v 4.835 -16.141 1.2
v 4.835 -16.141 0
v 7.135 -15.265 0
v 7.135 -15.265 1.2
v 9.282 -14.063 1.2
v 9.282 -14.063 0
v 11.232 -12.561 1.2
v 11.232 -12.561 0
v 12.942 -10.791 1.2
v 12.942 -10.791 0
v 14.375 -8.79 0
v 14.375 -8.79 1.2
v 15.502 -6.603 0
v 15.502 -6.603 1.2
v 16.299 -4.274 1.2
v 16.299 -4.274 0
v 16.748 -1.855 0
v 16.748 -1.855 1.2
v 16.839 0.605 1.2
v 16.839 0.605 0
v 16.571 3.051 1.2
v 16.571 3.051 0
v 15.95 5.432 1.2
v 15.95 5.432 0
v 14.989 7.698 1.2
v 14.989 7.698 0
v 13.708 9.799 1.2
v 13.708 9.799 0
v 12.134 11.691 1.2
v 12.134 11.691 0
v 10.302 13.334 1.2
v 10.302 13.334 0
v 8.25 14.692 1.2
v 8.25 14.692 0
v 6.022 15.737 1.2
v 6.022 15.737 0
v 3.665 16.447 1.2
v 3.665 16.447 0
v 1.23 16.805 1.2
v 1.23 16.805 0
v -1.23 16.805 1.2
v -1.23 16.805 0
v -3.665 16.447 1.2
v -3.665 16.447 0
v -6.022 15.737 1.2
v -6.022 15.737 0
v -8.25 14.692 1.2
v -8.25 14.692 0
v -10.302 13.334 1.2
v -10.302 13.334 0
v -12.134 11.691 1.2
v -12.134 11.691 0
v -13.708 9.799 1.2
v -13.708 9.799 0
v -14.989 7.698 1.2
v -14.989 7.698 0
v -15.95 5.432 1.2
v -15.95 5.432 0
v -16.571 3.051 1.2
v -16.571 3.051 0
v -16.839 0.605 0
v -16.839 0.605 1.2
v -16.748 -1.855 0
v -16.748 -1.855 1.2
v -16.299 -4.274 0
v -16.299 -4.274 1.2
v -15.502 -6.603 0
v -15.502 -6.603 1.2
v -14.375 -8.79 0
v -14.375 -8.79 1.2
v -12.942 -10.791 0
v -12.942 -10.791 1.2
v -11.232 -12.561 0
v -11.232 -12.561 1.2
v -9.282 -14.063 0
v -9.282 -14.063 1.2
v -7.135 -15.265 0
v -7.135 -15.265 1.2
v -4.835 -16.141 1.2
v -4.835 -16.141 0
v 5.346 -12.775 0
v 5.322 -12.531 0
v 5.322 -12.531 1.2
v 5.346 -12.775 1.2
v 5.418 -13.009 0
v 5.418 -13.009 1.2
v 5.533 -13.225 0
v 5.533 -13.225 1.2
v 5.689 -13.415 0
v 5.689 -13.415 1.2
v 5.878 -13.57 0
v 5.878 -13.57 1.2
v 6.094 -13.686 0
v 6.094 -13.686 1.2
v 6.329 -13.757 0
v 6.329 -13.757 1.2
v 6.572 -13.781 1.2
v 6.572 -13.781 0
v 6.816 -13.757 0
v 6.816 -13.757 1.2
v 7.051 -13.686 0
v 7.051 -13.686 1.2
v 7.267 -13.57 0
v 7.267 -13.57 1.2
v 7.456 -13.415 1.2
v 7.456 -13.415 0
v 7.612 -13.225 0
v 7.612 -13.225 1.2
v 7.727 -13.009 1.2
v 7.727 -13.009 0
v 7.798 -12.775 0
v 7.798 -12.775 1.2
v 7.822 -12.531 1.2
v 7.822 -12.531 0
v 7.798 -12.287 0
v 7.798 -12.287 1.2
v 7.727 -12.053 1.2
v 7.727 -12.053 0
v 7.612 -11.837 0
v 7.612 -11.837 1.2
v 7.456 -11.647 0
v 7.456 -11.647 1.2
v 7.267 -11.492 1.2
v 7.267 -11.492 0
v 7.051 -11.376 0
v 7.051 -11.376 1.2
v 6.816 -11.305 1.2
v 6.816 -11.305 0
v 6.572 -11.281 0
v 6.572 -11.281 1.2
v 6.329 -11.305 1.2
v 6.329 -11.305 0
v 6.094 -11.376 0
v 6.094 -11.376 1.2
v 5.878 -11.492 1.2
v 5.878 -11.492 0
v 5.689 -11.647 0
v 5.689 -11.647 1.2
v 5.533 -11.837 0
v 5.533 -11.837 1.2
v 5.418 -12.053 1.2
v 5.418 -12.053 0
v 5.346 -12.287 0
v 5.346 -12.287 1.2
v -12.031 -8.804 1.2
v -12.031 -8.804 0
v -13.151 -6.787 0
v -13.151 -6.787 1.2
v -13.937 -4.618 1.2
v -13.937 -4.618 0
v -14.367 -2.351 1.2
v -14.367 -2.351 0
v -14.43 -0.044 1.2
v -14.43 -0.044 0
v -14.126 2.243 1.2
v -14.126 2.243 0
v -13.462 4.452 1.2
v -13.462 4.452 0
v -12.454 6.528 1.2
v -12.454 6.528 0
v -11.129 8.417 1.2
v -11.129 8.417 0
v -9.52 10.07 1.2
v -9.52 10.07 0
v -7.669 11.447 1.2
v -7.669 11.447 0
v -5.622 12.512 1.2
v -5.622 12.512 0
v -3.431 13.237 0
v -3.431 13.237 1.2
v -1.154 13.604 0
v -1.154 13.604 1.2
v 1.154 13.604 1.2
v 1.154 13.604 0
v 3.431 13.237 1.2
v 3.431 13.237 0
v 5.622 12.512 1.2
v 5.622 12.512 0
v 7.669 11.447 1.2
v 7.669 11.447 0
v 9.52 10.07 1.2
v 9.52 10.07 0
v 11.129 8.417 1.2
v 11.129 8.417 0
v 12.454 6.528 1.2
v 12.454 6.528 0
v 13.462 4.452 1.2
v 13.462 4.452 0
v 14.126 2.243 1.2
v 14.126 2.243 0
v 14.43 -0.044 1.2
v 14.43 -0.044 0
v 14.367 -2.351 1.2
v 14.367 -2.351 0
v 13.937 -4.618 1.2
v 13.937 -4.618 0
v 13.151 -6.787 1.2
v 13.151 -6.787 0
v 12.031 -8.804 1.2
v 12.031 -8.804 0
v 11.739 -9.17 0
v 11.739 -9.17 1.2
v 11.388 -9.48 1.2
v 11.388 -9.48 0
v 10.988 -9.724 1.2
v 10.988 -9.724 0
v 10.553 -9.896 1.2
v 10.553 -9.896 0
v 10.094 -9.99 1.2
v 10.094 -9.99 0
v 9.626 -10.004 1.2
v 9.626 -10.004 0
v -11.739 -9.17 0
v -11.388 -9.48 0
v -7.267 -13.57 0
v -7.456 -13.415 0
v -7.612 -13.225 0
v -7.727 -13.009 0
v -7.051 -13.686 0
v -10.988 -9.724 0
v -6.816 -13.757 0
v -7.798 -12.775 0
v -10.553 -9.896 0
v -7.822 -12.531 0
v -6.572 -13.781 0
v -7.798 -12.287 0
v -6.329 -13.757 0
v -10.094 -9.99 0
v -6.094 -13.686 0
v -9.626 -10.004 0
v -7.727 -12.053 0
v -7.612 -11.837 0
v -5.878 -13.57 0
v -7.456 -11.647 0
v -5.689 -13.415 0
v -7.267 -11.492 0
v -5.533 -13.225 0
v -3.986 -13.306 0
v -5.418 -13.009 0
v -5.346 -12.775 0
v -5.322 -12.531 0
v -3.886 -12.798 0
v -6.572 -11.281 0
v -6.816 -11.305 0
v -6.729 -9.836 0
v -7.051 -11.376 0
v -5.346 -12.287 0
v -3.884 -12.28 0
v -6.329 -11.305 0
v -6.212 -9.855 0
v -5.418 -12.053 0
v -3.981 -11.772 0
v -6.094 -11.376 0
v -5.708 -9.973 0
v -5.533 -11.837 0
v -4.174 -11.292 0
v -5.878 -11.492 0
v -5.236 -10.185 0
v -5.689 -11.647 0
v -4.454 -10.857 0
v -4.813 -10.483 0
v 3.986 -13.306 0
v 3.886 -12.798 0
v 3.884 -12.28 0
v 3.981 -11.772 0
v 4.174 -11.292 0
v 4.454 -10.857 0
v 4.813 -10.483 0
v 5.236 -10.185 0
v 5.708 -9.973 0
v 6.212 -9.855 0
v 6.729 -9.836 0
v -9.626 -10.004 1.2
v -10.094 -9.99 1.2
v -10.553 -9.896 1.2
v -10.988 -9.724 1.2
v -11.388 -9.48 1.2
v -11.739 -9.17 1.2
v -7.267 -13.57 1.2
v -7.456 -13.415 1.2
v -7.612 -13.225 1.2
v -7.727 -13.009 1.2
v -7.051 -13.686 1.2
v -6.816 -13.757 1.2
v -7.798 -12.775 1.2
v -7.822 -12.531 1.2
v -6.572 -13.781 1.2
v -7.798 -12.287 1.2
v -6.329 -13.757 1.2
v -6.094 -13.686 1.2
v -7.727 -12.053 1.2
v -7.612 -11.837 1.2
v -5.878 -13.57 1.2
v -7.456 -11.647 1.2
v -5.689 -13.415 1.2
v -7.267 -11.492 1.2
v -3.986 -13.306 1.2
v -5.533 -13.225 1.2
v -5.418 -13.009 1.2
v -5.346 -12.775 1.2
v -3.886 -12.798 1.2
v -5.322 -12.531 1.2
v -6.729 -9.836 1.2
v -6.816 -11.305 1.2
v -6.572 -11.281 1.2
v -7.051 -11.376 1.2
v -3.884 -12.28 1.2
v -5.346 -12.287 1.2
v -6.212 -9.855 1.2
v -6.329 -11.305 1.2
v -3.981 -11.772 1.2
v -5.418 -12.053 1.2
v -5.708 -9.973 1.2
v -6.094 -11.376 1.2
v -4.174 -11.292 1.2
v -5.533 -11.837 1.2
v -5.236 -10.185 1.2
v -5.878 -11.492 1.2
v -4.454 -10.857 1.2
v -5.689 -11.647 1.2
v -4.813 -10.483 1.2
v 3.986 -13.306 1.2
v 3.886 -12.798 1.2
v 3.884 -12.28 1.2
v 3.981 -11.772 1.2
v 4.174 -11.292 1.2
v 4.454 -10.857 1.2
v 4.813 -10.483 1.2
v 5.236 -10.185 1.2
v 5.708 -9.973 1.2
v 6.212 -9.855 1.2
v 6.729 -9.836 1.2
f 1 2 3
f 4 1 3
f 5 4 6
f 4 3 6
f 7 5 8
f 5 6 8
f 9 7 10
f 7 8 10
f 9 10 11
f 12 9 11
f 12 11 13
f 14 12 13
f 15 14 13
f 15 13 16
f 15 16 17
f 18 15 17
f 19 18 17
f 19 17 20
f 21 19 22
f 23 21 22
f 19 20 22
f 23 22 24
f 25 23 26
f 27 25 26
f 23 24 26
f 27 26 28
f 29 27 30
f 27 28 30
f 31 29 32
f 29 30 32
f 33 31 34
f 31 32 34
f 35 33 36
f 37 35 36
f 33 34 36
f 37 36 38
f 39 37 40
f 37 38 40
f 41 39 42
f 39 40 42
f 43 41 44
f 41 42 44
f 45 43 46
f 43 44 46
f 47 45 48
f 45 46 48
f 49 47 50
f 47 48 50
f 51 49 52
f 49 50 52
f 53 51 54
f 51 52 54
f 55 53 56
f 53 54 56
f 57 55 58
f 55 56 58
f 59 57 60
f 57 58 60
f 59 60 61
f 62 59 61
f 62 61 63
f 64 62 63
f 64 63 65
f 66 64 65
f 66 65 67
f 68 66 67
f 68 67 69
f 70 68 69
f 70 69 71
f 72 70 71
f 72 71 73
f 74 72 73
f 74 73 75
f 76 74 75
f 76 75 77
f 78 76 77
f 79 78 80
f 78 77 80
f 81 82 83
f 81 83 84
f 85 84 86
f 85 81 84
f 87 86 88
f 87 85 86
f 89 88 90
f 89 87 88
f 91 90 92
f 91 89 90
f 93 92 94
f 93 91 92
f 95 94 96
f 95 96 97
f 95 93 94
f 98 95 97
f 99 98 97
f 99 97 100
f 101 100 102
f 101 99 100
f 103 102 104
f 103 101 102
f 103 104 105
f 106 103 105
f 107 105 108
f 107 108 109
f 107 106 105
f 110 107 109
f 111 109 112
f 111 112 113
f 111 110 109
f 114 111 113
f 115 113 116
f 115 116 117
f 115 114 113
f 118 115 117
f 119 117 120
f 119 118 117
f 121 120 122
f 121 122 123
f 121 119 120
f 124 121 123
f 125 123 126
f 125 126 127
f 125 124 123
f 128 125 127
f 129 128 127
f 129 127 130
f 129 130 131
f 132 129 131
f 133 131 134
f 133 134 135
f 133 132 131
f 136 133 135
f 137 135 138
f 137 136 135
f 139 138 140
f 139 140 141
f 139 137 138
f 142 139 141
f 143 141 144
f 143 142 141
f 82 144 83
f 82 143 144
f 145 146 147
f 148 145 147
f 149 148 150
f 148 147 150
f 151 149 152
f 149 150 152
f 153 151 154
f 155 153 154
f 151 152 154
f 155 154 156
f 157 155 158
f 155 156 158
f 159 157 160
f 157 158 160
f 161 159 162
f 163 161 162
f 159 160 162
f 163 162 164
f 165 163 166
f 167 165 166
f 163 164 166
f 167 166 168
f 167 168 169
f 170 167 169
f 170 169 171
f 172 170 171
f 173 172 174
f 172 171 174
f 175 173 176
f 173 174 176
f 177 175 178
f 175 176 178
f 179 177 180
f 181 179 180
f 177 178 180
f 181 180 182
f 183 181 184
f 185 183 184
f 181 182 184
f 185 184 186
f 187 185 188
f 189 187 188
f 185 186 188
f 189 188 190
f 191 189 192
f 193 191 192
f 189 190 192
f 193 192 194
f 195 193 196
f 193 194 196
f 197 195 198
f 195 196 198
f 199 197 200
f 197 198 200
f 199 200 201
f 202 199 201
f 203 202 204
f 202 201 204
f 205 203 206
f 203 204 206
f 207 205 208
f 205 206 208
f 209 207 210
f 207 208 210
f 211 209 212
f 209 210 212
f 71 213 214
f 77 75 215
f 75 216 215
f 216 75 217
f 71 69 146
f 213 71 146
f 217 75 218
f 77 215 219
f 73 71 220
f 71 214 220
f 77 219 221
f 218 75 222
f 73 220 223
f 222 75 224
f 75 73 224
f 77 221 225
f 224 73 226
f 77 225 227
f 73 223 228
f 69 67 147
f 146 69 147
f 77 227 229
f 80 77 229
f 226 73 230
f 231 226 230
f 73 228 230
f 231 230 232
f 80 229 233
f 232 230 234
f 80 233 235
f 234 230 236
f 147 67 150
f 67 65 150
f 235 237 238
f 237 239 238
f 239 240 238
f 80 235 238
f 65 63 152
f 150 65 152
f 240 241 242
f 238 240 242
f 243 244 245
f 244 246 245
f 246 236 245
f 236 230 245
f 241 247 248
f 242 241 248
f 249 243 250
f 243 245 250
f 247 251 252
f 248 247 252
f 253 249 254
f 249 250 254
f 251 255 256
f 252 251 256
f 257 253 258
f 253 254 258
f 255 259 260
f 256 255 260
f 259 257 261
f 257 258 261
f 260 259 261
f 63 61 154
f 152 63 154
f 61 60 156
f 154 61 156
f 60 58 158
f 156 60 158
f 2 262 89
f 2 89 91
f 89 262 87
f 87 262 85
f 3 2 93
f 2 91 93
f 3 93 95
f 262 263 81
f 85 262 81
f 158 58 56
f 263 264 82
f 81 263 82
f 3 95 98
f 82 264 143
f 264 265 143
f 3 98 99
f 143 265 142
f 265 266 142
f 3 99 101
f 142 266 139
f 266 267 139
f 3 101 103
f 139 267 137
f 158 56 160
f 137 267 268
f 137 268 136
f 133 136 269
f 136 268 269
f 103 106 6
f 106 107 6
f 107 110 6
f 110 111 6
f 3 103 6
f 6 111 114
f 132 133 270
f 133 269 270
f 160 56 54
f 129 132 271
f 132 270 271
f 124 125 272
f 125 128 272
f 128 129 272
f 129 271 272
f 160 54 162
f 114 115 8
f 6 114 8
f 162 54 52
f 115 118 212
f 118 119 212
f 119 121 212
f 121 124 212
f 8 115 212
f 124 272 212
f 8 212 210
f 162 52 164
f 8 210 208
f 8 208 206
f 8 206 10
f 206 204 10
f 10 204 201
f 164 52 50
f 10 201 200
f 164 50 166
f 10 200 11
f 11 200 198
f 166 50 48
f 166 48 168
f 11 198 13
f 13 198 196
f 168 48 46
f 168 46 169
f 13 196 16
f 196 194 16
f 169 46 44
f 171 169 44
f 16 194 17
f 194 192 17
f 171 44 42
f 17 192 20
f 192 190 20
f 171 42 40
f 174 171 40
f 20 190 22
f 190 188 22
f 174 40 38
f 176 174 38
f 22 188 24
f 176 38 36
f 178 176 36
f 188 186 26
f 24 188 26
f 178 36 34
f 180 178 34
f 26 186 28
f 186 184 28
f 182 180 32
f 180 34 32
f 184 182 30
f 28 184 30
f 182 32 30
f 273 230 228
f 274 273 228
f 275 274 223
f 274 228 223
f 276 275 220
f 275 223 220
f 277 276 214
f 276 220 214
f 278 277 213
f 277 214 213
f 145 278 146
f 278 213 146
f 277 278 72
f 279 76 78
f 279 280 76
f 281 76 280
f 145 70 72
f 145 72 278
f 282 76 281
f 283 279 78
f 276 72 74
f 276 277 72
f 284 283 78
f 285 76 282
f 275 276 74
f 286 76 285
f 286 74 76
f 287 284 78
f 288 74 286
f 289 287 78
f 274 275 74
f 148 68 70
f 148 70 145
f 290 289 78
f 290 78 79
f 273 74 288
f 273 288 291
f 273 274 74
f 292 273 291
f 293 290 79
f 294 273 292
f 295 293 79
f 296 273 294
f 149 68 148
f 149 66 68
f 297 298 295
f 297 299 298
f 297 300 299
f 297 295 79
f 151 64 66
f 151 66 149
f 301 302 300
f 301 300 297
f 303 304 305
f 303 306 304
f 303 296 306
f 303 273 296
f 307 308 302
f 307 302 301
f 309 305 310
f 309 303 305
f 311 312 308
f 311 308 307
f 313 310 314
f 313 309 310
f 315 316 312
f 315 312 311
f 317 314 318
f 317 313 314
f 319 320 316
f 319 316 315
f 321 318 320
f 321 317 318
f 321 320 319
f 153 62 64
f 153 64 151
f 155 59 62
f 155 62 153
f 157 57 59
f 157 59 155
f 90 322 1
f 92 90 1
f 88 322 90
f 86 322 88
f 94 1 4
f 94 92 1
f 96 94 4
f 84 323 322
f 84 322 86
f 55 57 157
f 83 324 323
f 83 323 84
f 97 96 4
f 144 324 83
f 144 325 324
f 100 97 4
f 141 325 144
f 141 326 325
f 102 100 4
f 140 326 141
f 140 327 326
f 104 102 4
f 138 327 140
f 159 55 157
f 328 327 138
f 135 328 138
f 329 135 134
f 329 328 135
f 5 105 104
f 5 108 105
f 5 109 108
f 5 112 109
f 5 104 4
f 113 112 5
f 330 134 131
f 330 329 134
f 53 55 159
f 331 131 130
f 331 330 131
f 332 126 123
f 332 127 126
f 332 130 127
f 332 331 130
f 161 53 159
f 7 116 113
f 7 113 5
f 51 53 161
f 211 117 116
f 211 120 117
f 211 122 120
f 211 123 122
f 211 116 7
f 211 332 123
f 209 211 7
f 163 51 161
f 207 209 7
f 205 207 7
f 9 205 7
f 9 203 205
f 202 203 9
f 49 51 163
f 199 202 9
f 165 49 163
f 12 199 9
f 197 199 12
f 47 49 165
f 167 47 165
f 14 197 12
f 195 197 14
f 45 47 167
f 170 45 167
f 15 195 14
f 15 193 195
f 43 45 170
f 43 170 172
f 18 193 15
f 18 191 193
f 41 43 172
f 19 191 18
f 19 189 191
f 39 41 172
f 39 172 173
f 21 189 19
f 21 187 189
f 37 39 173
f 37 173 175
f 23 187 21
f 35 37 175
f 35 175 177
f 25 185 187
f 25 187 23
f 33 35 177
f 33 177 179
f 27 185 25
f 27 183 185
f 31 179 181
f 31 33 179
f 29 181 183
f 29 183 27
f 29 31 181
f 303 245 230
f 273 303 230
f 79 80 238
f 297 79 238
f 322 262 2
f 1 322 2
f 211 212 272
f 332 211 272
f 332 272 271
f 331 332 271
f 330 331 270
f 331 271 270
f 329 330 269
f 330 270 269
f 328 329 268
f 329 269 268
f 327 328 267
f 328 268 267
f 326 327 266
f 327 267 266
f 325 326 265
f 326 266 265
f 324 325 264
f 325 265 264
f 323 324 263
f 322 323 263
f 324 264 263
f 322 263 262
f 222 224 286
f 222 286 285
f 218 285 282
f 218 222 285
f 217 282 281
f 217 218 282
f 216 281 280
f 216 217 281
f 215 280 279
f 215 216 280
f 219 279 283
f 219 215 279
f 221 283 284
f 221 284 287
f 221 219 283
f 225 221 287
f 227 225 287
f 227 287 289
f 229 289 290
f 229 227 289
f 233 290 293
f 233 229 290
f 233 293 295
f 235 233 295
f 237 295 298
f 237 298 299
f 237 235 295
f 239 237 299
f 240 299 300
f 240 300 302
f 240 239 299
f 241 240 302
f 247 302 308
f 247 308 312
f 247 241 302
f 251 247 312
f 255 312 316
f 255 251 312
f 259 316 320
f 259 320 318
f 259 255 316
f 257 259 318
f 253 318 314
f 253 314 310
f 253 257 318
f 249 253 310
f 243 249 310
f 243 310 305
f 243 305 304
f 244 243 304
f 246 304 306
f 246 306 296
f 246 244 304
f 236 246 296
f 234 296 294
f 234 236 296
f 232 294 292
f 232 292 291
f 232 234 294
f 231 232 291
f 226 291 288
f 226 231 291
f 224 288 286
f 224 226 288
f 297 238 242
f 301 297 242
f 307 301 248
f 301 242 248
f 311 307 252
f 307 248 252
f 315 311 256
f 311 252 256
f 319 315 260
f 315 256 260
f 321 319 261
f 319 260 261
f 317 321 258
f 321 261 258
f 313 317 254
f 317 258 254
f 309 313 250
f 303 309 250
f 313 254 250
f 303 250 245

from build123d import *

# Parameters (mm, degrees)
ESQUISSE1_R          = 1.25
BASE_EXTRUSION_DEPTH = 1.2


with BuildPart() as part:
    # Esquisse1 → Base-Extrusion (new body)
    with BuildSketch(Plane.XY):
        with BuildLine():
            Line((3.985998124, -13.3058002), (4.835421078, -16.141288765))
            ThreePointArc((4.835421078, -16.141288765), (0, 16.85), (-4.835421078, -16.141288765))
            Line((-4.835421078, -16.141288765), (-3.985998124, -13.3058002))
            ThreePointArc((-3.985998124, -13.3058002), (-4.454224724, -10.856714777), (-6.728961799, -9.835525864))
            Line((-6.728961799, -9.835525864), (-9.626331919, -10.00377658))
            ThreePointArc((-9.626331919, -10.00377658), (-10.988469241, -9.724202556), (-12.030833428, -8.803845765))
            ThreePointArc((-12.030833428, -8.803845765), (0, 13.65), (12.030833428, -8.803845765))
            ThreePointArc((12.030833428, -8.803845765), (10.988469241, -9.724202556), (9.626331919, -10.00377658))
            Line((9.626331919, -10.00377658), (6.728961799, -9.835525864))
            ThreePointArc((6.728961799, -9.835525864), (4.454224724, -10.856714777), (3.985998124, -13.3058002))
        make_face()
        with Locations(Location((6.572436087, -12.530984953, 0), (0, 0, 180))):
            Circle(ESQUISSE1_R, mode=Mode.SUBTRACT)
        with Locations(Location((-6.572436087, -12.530984953, 0), (0, 0, 180))):
            Circle(ESQUISSE1_R, mode=Mode.SUBTRACT)
    extrude(amount=BASE_EXTRUSION_DEPTH)


solid = part.part
